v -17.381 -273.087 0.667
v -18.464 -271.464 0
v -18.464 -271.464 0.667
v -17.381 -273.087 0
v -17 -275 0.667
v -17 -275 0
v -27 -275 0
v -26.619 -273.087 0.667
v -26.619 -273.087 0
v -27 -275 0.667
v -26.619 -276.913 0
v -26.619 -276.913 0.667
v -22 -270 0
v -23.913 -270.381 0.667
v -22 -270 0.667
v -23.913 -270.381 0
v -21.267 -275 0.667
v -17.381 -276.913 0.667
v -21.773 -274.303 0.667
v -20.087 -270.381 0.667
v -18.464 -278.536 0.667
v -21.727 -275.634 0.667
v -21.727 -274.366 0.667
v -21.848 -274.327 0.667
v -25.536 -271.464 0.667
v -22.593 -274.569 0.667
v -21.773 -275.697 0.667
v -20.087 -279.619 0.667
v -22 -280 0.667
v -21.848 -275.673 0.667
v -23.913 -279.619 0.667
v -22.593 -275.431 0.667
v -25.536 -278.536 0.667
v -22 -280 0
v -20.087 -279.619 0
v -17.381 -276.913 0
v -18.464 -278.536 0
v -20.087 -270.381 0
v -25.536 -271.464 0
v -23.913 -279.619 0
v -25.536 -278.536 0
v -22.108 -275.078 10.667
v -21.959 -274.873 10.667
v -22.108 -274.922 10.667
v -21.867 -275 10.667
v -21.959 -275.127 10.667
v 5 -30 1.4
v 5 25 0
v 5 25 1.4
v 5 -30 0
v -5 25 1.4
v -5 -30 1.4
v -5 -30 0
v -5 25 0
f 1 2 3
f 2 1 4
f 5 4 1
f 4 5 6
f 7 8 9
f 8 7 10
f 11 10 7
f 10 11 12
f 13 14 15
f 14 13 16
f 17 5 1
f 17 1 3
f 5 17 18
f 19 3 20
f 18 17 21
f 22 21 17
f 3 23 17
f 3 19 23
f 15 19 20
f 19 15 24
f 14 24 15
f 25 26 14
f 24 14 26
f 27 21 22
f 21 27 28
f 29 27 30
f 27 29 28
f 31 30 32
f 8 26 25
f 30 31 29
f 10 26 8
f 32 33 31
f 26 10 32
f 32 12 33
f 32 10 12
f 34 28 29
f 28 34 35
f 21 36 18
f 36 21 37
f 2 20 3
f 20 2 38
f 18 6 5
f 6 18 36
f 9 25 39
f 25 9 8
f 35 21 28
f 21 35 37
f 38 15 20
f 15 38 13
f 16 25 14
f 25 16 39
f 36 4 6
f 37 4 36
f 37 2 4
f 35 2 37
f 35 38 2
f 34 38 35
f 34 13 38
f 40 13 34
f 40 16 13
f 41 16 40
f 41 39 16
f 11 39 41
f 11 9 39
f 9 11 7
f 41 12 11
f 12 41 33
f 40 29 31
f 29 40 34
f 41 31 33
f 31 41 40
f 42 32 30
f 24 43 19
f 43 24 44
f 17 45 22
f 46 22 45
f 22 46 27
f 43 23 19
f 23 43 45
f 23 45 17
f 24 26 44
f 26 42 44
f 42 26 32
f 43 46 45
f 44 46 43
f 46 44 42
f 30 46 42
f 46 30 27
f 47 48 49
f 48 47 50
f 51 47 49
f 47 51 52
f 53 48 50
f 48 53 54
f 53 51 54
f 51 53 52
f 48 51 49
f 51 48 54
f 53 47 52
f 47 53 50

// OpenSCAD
wallThick = 2;  //sets width of wall at base
cutterMinimum = .2;  //sets width of wall at top
baseHeight = 2;
height = 10;
flangeWidth = 5;


translate([-22,-275,0])union(){
    minkowski(){
    outline();
    cylinder(r1 = wallThick/3, r2 = cutterMinimum/3, h = height);
    };
//%cube([.5, .5, height*3], true);
    
    flange();
    
    }
    translate([-5,-30,0])cube([10,55,baseHeight*.7]);

module flange(){
	difference(){
	minkowski(){
	baseShape(baseHeight/3);
	cylinder(r = flangeWidth, h = baseHeight/3);
	}
	translate([0,0,-0.01])baseShape(baseHeight*1.1);
	};
}



module outline(){
	difference(){
	minkowski(){
	baseShape(baseHeight/3);
	cylinder(r = cutterMinimum/3, h = baseHeight/3);
	}
	translate([0,0,-0.01])baseShape(baseHeight*1.1);
	};
};

module baseShape(H){
linear_extrude(height=H)
import("cross.dxf");
}
